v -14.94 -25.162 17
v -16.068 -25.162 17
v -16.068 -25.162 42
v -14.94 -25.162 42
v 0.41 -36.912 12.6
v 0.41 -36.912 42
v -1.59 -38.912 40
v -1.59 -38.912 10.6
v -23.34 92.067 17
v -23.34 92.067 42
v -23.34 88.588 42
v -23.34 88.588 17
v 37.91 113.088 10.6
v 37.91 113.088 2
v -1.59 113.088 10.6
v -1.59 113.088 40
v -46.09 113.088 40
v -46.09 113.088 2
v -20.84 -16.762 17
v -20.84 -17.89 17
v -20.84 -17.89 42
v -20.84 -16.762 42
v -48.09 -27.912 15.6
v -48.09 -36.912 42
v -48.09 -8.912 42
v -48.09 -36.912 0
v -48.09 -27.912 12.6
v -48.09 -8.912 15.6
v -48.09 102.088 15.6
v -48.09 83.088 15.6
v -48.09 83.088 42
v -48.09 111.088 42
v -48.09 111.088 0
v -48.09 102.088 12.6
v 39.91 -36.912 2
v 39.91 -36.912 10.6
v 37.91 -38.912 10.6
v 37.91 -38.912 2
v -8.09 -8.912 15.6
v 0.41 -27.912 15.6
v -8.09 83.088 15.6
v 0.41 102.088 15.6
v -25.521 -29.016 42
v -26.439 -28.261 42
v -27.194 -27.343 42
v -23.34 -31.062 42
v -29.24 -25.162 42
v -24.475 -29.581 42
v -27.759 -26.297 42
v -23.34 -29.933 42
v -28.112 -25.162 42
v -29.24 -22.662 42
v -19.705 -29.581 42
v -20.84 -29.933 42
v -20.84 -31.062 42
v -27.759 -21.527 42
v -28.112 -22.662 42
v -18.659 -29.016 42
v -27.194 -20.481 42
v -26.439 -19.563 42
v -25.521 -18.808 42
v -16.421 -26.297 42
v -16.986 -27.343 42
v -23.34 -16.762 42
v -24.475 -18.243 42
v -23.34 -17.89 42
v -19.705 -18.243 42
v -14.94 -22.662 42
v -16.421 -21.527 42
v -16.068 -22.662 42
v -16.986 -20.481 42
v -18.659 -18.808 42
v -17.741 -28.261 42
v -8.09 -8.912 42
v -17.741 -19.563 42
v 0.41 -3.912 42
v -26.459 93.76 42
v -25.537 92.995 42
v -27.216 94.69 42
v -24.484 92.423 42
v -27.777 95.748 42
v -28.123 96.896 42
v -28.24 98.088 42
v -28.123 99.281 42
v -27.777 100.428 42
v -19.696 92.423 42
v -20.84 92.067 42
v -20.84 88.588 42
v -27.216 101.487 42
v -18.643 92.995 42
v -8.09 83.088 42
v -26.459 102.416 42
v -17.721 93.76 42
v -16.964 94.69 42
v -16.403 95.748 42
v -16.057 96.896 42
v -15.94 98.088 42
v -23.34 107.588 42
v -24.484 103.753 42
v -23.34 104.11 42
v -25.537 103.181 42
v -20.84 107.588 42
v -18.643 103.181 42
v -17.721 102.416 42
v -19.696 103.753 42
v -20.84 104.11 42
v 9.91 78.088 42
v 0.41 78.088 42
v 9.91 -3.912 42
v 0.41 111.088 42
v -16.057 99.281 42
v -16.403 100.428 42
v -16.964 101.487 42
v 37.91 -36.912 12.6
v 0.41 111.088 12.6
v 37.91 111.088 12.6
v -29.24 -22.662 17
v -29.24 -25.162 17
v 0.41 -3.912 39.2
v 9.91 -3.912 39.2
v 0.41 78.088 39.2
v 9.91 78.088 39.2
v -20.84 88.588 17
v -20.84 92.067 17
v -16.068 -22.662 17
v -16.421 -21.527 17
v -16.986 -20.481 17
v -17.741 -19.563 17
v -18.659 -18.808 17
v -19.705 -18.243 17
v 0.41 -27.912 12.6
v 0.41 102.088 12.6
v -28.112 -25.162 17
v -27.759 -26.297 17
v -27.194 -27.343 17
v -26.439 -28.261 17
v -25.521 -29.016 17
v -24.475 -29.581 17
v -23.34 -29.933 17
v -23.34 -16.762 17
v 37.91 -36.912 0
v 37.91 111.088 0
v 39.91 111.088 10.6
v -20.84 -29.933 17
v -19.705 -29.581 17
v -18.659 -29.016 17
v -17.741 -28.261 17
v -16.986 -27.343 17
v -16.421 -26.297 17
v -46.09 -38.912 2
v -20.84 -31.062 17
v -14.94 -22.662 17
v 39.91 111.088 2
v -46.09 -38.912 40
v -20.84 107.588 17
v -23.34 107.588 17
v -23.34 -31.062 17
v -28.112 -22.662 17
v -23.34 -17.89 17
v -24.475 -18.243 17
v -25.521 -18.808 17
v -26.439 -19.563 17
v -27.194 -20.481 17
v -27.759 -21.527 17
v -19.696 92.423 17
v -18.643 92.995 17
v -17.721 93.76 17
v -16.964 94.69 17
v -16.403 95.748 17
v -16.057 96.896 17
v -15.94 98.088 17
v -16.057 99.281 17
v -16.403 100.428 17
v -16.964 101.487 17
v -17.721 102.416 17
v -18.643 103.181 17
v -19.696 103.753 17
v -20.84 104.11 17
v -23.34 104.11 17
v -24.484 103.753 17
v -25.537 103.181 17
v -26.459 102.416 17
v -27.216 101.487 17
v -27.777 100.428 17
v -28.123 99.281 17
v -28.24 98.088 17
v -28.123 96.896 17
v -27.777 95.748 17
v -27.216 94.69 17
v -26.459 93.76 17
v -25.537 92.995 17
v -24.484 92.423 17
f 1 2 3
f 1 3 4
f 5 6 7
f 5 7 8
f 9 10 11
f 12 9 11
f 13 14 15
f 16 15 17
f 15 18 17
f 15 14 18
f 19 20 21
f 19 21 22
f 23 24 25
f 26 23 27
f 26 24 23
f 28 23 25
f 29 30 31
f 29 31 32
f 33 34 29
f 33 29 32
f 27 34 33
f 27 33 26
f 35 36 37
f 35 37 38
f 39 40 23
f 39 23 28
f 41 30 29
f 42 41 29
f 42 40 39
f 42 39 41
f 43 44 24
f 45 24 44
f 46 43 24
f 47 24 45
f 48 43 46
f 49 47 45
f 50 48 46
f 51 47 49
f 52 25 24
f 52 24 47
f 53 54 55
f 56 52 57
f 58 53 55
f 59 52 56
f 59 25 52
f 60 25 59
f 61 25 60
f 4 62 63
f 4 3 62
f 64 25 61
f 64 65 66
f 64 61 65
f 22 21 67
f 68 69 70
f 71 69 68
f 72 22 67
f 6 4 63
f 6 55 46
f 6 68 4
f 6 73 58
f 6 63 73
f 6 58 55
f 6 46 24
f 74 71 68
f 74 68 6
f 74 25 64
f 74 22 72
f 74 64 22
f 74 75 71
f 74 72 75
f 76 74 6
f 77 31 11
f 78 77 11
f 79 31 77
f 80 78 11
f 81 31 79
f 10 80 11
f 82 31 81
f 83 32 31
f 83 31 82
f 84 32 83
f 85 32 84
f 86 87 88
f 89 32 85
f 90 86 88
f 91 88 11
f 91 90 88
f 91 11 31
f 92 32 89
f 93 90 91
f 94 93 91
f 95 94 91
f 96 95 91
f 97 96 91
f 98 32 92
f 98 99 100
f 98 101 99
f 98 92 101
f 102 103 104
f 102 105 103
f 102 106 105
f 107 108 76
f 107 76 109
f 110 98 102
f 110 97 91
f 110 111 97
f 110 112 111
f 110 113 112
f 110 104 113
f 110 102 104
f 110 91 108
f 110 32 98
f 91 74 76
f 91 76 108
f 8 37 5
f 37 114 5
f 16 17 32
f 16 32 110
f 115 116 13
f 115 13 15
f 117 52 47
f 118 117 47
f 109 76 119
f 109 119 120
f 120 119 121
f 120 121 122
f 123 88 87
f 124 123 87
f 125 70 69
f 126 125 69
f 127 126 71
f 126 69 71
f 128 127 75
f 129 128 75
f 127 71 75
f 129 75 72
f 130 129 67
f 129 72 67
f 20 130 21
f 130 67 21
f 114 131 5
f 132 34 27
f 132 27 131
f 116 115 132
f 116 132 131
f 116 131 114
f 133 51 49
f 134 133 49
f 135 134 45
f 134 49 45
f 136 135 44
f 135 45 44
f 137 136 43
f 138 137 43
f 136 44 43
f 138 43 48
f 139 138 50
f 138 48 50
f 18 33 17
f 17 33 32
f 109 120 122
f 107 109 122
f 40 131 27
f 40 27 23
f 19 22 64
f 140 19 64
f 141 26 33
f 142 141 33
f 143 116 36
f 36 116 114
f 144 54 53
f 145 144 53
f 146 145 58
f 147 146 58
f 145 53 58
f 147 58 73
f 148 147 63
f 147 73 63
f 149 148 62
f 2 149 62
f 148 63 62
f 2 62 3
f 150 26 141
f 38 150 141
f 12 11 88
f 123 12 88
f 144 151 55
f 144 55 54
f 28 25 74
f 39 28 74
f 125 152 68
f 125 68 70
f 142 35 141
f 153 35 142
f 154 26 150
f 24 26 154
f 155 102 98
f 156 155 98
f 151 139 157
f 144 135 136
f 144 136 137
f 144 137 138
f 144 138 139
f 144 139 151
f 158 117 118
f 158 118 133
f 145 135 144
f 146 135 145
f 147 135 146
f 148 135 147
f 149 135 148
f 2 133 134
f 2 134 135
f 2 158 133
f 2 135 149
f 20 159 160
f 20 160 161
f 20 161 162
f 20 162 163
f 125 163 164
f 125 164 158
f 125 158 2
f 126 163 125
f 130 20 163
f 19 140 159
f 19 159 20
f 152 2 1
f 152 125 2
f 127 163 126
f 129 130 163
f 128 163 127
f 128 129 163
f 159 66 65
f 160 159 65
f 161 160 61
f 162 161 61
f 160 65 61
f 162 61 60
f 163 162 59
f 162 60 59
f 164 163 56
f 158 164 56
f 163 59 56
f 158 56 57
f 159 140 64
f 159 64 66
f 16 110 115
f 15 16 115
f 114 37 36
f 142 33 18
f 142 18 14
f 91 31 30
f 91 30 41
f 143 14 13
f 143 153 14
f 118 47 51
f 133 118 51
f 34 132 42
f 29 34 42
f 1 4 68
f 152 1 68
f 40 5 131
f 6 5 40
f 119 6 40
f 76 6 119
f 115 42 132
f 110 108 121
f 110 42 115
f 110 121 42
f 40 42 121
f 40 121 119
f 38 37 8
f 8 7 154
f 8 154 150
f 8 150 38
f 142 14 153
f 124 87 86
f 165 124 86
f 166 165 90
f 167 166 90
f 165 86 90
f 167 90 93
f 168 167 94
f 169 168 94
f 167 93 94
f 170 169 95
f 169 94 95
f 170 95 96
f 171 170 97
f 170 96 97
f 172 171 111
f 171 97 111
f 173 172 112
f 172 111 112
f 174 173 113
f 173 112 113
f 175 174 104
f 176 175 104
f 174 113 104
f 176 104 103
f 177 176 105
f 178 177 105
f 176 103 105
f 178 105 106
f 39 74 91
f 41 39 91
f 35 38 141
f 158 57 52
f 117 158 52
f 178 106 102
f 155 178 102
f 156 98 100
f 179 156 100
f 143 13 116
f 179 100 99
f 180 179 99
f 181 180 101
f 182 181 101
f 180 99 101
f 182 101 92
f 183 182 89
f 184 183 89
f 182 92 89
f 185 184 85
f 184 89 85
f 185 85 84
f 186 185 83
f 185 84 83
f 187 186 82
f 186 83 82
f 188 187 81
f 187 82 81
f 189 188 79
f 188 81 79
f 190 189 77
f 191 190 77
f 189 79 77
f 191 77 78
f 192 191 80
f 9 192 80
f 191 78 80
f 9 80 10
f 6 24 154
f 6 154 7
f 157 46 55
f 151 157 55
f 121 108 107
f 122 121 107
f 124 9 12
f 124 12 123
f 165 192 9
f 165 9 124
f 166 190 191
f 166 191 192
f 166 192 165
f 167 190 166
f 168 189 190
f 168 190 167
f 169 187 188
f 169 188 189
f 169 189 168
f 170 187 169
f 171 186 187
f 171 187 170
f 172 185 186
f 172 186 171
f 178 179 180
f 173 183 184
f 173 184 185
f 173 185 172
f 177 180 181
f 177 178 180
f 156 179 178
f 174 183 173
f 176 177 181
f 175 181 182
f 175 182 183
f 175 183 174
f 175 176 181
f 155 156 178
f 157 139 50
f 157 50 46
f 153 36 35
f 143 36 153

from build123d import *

# Parameters (mm, degrees)
F0_W      = 58
F0_H      = 152
F1_DEPTH  = 42
F3_DEPTH  = 25
F4_DEPTH  = 25
F5_W      = 130
F5_H      = 3
F6_DEPTH  = 58
F7_DEPTH  = 30
F8_W      = 9.5
F8_H      = 35
F9_DEPTH  = 29.4
F10_W     = 9.5
F10_H     = 23.6
F11_DEPTH = 82
F12_SIZE  = 2
F13_W     = 40
F13_H     = 92
F14_DEPTH = 26.4


with BuildPart() as f1:
    # F0 (on Top) → F1 (new body)
    with BuildSketch(Plane.XY):
        with Locations((-19.09, 37.088177)):
            Rectangle(F0_W, F0_H)
    extrude(amount=F1_DEPTH)

    # F2 (on face) → F3 (cut)
    with BuildSketch(Plane.XY.offset(42)):
        with BuildLine():
            Line((-20.84, 88.588177), (-20.84, 92.066549))
            ThreePointArc((-20.84, 92.066549), (-15.94, 98.088177), (-20.84, 104.109805))
            Line((-20.84, 104.109805), (-20.84, 107.588177))
            Line((-20.84, 107.588177), (-23.34, 107.588177))
            Line((-23.34, 107.588177), (-23.34, 104.109805))
            ThreePointArc((-23.34, 104.109805), (-28.24, 98.088177), (-23.34, 92.066549))
            Line((-23.34, 92.066549), (-23.34, 88.588177))
            Line((-23.34, 88.588177), (-20.84, 88.588177))
        make_face()
    extrude(amount=-F3_DEPTH, mode=Mode.SUBTRACT)

    # F2 (on face) → F4 (cut)
    with BuildSketch(Plane.XY.offset(42)):
        with BuildLine():
            Line((-20.84, -31.061823), (-20.84, -29.933451))
            ThreePointArc((-20.84, -29.933451), (-17.741293, -28.26053), (-16.068372, -25.161823))
            Line((-16.068372, -25.161823), (-14.94, -25.161823))
            Line((-14.94, -25.161823), (-14.94, -22.661823))
            Line((-14.94, -22.661823), (-16.068372, -22.661823))
            ThreePointArc((-16.068372, -22.661823), (-17.741293, -19.563116), (-20.84, -17.890195))
            Line((-20.84, -17.890195), (-20.84, -16.761823))
            Line((-20.84, -16.761823), (-23.34, -16.761823))
            Line((-23.34, -16.761823), (-23.34, -17.890195))
            ThreePointArc((-23.34, -17.890195), (-26.438706, -19.563116), (-28.111627, -22.661823))
            Line((-28.111627, -22.661823), (-29.24, -22.661823))
            Line((-29.24, -22.661823), (-29.24, -25.161823))
            Line((-29.24, -25.161823), (-28.111627, -25.161823))
            ThreePointArc((-28.111627, -25.161823), (-26.438706, -28.26053), (-23.34, -29.933451))
            Line((-23.34, -29.933451), (-23.34, -31.061823))
            Line((-23.34, -31.061823), (-20.84, -31.061823))
        make_face()
    extrude(amount=-F4_DEPTH, mode=Mode.SUBTRACT)

    # F5 (on face) → F6 (cut, through all)
    with BuildSketch(Plane.YZ.offset(9.91)):
        with Locations((37.088177, 14.1)):
            Rectangle(F5_W, F5_H)
    extrude(amount=-F6_DEPTH, mode=Mode.SUBTRACT)

    # F5 (on face) → F7 (join)
    with BuildSketch(Plane.YZ.offset(9.91)):
        Polygon((102.088177, 12.6), (-27.911823, 12.6), (-38.911823, 12.6), (-38.911823, 0), (113.088177, 0), (113.088177, 12.6), align=None)
    extrude(amount=F7_DEPTH)

    # F8 (on face) → F9 (cut, through all)
    with BuildSketch(Plane.XY.offset(42)):
        with Locations((5.16, -21.411823)):
            Rectangle(F8_W, F8_H)
        with Locations((5.16, 95.588177)):
            Rectangle(F8_W, F8_H)
    extrude(amount=-F9_DEPTH, mode=Mode.SUBTRACT)

    # F10 (on face) → F11 (cut, through all)
    with BuildSketch(Plane.XZ.offset(3.911823)):
        with Locations((5.16, 27.4)):
            Rectangle(F10_W, F10_H)
    extrude(amount=-F11_DEPTH, mode=Mode.SUBTRACT)

    # F12
    f12_edges = [f1.edges().sort_by_distance(p)[0] for p in [
        (-4.09, -38.911823, 0),
        (-48.09, -38.911823, 21),
        (-23.84, -38.911823, 42),
        (0.41, -38.911823, 27.3),
        (20.16, -38.911823, 12.6),
        (39.91, -38.911823, 6.3),
        (39.91, 113.088177, 6.3),
        (20.16, 113.088177, 12.6),
        (0.41, 113.088177, 27.3),
        (-23.84, 113.088177, 42),
        (-48.09, 113.088177, 21),
        (-4.09, 113.088177, 0),
        (39.91, 37.088177, 12.6),
        (39.91, 37.088177, 0),
    ]]
    chamfer(f12_edges, length=F12_SIZE)

    # F13 (on face) → F14 (cut, through all)
    with BuildSketch(Plane.XY.offset(42)):
        with Locations((-28.09, 37.088177)):
            Rectangle(F13_W, F13_H)
    extrude(amount=-F14_DEPTH, mode=Mode.SUBTRACT)


solid = f1.part
